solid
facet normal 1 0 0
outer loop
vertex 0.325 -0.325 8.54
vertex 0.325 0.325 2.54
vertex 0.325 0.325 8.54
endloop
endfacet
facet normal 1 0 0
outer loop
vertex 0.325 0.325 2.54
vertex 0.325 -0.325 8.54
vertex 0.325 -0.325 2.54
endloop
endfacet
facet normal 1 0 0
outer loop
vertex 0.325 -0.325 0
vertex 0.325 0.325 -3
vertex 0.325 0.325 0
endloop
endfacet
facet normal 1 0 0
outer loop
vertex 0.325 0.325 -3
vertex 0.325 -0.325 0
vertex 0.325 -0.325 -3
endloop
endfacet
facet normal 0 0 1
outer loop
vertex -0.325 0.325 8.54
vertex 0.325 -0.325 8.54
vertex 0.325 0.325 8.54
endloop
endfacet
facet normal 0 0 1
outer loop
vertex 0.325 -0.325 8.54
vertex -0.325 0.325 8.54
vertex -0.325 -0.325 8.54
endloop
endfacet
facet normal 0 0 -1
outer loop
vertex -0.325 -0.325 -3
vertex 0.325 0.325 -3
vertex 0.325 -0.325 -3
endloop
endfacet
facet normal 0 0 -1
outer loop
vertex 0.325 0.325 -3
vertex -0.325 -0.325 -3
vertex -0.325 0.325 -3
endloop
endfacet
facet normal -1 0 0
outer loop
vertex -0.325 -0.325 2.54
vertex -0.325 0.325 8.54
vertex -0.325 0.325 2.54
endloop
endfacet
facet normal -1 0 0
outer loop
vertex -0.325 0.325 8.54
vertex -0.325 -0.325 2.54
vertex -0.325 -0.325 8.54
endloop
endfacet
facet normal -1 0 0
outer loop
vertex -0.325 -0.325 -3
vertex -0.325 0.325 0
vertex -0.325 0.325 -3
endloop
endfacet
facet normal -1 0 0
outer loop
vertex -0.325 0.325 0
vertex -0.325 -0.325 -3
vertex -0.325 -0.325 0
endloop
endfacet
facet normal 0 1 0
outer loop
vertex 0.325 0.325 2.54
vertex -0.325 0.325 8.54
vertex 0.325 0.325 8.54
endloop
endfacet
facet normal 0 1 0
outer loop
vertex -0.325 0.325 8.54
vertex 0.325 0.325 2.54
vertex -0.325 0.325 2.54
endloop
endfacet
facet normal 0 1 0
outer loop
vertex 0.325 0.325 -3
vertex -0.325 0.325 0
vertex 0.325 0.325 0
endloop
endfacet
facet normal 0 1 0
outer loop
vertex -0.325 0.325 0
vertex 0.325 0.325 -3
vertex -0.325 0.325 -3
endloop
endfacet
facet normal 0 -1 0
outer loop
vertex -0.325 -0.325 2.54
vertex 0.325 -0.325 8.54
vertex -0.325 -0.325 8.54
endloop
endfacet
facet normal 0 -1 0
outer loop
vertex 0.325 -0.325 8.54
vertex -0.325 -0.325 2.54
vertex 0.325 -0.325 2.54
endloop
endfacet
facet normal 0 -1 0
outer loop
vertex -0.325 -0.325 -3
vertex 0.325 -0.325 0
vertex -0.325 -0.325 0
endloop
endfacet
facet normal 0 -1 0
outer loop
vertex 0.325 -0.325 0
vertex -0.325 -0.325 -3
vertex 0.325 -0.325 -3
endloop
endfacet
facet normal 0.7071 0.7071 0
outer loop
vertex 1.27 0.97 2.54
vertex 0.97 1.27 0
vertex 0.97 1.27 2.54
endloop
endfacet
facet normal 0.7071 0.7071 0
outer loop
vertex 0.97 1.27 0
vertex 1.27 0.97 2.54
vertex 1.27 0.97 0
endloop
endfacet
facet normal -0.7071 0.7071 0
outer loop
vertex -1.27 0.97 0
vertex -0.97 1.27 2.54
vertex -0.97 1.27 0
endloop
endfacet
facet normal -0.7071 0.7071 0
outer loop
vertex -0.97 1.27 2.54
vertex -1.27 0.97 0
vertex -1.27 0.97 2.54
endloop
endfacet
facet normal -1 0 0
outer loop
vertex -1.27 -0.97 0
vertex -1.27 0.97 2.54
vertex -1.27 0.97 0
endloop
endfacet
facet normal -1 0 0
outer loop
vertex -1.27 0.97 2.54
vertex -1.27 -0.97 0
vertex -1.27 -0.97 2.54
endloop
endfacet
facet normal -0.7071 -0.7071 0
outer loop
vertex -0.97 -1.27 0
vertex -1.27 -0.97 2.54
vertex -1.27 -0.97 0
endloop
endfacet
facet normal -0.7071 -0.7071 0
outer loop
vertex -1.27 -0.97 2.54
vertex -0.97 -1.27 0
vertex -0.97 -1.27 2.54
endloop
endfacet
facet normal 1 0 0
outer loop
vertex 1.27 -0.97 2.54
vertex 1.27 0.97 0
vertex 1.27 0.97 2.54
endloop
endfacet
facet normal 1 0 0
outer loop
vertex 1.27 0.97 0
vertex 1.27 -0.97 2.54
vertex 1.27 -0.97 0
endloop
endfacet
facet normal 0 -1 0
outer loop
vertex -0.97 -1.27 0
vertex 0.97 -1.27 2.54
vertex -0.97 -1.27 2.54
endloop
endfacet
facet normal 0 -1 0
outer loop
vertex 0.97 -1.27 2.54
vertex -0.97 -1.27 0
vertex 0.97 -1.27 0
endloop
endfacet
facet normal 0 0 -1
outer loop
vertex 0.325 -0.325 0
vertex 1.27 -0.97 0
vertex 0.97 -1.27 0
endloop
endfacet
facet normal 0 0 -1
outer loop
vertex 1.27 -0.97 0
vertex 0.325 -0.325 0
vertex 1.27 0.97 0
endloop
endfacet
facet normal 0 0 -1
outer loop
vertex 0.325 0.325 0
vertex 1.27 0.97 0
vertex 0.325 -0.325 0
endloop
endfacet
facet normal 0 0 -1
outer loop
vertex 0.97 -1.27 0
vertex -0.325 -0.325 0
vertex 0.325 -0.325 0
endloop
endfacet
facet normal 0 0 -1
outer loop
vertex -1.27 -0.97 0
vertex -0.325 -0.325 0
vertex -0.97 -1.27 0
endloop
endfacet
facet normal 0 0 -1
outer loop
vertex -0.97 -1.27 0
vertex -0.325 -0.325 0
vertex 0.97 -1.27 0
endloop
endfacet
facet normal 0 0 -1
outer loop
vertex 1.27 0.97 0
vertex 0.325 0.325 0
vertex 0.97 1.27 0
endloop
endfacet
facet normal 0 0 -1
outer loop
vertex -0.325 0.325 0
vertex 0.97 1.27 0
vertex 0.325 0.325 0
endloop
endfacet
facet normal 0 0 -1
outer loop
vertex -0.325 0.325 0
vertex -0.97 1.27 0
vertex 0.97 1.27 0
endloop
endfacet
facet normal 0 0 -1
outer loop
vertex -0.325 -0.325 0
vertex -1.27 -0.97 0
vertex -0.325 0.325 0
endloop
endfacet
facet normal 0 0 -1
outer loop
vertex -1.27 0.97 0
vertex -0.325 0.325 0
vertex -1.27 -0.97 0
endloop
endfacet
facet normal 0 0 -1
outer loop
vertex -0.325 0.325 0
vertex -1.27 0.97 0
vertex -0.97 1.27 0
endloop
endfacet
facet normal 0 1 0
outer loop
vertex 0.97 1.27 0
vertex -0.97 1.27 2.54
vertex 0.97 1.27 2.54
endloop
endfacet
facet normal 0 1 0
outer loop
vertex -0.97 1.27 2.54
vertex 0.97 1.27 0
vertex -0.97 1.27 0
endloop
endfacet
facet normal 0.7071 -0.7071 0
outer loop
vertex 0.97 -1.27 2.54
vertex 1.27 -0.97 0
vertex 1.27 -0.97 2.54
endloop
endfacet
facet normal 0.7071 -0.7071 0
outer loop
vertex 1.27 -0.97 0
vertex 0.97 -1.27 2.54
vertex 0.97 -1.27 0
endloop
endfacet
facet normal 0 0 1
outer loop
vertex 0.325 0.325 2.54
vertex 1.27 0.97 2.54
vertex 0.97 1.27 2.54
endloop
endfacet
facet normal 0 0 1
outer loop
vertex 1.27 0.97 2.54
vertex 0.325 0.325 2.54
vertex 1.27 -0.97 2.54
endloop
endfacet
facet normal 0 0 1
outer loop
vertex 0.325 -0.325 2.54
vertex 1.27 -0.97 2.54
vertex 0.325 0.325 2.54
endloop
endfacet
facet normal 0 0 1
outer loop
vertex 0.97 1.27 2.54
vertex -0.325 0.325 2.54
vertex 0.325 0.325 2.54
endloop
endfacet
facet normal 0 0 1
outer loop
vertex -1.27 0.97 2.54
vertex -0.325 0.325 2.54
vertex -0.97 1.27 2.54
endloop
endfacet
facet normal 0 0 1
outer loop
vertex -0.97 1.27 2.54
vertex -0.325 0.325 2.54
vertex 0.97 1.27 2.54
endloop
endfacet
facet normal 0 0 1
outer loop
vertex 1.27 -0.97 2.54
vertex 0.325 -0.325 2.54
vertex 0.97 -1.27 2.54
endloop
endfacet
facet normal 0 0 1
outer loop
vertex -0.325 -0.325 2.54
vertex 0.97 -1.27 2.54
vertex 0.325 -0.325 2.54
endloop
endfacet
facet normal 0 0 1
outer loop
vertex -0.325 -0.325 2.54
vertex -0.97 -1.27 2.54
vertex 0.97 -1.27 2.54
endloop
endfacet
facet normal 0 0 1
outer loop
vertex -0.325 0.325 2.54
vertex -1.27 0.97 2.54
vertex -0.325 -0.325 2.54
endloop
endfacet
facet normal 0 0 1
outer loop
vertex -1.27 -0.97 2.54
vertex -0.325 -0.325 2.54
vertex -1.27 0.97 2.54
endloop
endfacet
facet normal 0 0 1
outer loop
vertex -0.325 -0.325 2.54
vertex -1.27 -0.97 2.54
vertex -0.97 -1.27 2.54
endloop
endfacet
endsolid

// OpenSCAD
plastic_color = "#303030";
pin_color = "#FFC000";

module pin_header()
{
    union()
    {
        color(pin_color)
        translate([-0.325,-0.325,-3])
        cube([0.65,0.65,11.54]);

        color(plastic_color)
        linear_extrude(2.54)
        polygon(points=[[-0.97,-1.27],[0.97,-1.27],[1.27,-0.97],[1.27,0.97],[0.97,1.27],[-0.97,1.27],[-1.27,0.97],[-1.27,-0.97]], paths=[[0,1,2,3,4,5,6,7]]);
    }
}

pin_header();
